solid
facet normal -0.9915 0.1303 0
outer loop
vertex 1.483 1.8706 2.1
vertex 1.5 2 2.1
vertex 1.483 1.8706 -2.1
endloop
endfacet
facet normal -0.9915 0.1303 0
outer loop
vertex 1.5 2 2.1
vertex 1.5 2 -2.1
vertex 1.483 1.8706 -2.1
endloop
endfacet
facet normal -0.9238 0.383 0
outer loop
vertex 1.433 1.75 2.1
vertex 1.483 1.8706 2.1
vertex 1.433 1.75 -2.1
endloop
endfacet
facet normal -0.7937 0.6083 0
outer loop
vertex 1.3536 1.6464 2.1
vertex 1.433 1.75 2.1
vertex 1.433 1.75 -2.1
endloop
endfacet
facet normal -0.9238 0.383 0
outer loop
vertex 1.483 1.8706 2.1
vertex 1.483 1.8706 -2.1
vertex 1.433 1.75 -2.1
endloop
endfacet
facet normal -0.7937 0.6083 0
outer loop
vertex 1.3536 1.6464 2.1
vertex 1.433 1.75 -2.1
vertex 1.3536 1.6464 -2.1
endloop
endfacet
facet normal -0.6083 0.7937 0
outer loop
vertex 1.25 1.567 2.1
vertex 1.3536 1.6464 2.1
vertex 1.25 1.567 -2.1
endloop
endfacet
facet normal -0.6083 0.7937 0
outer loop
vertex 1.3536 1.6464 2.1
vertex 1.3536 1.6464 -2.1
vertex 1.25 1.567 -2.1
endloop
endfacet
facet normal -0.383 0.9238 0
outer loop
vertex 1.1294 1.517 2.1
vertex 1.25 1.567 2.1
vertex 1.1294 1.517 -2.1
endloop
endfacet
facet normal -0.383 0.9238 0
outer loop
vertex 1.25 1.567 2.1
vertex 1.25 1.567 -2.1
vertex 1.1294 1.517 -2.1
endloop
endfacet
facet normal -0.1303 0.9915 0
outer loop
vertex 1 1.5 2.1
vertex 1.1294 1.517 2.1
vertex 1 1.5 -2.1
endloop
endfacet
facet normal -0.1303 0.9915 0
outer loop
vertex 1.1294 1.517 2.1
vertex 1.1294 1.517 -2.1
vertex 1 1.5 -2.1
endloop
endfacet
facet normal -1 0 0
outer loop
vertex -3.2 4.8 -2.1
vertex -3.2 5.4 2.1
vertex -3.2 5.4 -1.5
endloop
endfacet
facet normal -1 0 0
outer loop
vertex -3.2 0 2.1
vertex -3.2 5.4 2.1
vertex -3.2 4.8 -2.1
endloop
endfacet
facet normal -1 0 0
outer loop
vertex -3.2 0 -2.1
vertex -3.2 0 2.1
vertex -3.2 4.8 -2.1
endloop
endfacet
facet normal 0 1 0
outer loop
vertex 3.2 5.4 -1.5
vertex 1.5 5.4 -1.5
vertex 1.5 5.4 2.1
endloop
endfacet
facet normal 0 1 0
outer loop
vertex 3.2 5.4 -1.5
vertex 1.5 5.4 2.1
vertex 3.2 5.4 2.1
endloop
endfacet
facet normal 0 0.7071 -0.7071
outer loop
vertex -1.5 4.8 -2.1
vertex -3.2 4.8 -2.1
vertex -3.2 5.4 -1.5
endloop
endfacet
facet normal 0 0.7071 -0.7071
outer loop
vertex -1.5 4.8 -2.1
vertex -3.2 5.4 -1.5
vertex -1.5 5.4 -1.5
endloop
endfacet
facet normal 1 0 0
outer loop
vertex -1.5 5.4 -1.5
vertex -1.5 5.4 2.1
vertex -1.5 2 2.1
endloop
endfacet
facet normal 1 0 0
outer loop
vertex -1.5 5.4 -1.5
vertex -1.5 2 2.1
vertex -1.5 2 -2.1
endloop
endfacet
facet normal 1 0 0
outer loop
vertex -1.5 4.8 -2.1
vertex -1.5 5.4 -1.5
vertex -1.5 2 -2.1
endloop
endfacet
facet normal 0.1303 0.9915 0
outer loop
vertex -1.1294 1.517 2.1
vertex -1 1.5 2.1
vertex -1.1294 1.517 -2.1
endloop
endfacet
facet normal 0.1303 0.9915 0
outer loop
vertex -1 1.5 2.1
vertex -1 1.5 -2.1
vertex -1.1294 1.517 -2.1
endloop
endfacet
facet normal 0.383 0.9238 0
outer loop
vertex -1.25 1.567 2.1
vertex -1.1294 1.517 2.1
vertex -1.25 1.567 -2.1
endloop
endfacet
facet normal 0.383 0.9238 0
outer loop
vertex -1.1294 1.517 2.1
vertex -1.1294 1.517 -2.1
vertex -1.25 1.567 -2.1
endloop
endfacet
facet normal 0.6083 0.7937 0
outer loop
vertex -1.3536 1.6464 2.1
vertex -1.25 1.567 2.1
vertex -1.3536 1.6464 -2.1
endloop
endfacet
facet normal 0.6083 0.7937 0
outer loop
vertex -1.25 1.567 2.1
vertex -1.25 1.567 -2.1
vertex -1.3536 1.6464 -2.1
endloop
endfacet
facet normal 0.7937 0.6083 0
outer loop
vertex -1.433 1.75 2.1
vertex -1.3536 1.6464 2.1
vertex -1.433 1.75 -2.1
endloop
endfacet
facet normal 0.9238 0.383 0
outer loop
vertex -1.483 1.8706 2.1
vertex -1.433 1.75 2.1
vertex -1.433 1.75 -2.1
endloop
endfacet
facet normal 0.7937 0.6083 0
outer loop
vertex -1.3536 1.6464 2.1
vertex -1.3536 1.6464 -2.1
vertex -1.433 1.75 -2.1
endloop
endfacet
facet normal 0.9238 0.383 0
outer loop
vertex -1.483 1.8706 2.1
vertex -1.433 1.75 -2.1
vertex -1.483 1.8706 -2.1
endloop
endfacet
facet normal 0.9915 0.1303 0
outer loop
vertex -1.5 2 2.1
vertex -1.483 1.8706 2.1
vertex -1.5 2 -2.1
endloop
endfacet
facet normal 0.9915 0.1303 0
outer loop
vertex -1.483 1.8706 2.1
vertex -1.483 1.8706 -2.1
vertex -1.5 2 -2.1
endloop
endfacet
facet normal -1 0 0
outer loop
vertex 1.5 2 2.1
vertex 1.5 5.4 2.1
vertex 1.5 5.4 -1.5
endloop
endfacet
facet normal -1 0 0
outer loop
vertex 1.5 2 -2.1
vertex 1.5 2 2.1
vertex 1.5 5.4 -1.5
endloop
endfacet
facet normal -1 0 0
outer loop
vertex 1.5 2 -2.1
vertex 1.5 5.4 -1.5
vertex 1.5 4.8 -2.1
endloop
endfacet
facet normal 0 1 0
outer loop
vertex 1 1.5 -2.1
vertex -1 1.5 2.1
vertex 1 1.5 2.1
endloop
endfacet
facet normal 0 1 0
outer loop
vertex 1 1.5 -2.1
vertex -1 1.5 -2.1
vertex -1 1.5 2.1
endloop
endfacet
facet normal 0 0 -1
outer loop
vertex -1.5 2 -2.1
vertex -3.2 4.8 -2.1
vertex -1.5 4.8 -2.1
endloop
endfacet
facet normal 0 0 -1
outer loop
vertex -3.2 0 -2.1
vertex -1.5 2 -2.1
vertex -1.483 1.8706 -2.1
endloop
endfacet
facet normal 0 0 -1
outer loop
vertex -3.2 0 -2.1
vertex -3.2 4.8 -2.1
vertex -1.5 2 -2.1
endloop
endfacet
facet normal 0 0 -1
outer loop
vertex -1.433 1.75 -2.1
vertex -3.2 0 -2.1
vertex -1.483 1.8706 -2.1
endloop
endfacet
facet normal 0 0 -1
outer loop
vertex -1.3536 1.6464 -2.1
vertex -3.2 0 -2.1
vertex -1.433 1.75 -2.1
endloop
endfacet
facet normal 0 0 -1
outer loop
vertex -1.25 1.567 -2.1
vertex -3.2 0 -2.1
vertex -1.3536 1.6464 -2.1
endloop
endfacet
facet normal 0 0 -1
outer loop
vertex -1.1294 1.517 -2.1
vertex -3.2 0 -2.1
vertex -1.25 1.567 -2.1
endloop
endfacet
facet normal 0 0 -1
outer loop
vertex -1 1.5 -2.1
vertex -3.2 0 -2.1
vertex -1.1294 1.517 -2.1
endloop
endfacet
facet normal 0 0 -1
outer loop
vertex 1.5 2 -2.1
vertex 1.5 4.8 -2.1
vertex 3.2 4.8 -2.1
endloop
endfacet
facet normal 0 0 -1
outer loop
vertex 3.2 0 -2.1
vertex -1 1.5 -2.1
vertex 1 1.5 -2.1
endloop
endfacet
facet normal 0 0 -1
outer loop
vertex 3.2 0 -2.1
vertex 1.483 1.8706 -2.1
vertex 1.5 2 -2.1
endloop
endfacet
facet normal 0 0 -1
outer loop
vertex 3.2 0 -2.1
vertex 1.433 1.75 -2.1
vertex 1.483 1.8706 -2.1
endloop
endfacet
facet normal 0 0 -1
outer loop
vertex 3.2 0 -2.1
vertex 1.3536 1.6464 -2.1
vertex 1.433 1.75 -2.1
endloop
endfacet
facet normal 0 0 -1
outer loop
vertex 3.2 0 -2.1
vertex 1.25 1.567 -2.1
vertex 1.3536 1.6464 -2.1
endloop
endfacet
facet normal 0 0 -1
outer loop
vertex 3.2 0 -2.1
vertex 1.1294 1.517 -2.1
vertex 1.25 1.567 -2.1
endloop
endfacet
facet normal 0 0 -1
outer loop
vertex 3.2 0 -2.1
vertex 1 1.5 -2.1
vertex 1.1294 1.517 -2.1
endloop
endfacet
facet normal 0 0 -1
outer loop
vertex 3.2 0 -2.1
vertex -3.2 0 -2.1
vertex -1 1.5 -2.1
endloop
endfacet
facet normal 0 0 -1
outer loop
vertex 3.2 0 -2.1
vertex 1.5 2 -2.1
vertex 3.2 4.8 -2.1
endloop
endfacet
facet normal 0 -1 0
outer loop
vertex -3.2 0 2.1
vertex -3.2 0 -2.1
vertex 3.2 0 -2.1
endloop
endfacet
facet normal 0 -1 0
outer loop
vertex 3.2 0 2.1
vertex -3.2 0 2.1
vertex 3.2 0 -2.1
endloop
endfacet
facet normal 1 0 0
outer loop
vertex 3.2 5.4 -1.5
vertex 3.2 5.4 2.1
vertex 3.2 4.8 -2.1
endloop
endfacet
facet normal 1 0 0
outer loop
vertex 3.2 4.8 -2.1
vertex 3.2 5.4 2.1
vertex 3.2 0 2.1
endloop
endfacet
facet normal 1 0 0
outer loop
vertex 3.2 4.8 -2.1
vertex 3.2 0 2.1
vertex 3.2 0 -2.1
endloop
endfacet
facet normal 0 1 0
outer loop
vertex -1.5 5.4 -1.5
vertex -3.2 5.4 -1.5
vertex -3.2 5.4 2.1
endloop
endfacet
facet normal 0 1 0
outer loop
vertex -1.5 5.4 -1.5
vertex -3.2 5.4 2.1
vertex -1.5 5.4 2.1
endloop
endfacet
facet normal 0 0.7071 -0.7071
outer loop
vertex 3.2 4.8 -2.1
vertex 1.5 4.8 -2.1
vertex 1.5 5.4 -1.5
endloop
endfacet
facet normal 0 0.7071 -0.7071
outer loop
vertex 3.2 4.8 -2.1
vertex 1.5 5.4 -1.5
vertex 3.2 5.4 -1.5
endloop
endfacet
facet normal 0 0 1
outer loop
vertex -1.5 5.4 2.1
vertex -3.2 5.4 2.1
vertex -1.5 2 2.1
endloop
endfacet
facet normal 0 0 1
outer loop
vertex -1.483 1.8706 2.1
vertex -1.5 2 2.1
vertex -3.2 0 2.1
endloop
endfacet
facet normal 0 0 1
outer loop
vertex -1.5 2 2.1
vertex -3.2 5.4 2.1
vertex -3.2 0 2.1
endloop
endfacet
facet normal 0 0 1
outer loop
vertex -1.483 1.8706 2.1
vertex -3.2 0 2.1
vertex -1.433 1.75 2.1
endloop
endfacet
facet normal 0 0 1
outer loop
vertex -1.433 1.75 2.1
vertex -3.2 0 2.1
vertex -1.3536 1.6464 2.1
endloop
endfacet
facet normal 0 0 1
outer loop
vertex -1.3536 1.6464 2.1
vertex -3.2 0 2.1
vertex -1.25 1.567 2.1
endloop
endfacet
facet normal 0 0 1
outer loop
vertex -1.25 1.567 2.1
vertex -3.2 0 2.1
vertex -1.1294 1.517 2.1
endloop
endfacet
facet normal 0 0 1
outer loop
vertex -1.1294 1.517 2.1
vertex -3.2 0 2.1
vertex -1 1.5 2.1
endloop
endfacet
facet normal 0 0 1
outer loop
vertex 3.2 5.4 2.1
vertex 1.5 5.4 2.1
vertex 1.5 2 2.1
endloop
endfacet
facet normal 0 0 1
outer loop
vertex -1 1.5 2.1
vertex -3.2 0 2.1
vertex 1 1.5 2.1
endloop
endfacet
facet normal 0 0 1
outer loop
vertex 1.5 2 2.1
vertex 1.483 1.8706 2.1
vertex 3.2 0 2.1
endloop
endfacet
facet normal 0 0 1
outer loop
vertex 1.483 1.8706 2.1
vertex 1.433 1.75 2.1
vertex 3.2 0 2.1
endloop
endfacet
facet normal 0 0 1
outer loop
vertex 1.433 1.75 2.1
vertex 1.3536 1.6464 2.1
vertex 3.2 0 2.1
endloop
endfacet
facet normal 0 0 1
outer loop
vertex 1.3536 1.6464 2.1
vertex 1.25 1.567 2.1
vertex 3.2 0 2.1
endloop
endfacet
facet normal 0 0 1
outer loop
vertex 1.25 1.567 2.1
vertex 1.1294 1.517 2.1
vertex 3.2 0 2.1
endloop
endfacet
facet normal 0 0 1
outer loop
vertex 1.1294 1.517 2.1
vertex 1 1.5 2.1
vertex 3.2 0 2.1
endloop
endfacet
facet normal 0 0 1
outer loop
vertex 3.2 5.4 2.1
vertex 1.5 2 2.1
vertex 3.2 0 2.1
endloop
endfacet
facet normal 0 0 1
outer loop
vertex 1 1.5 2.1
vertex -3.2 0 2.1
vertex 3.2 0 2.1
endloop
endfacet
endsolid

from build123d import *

# Parameters (mm, degrees)
SKETCH1_W           = 6.4
SKETCH1_H           = 4.2
BOSS_EXTRUDE1_DEPTH = 5.4
SKETCH2_W           = 3
SKETCH2_H           = 4.2
CUT_EXTRUDE1_DEPTH  = 3.9
FILLET1_R           = 0.5
CHAMFER1_SIZE       = 0.6


with BuildPart() as part:
    # Sketch1 → Boss-Extrude1 (new body)
    with BuildSketch(Plane(origin=(0, 0, 0), x_dir=(1, 0, 0), z_dir=(0, 1, 0))):
        Rectangle(SKETCH1_W, SKETCH1_H)
    extrude(amount=BOSS_EXTRUDE1_DEPTH)

    # Sketch2 → Cut-Extrude1 (cut)
    with BuildSketch(Plane(origin=(0, 5.4, 0), x_dir=(1, 0, 0), z_dir=(0, 1, 0))):
        Rectangle(SKETCH2_W, SKETCH2_H)
    extrude(amount=-CUT_EXTRUDE1_DEPTH, mode=Mode.SUBTRACT)

    # Fillet1
    fillet1_edges = [part.edges().sort_by_distance(p)[0] for p in [
        (-1.5, 1.5, 0),
        (1.5, 1.5, 0),
    ]]
    fillet(fillet1_edges, radius=FILLET1_R)

    # Chamfer1
    chamfer1_edges = [part.edges().sort_by_distance(p)[0] for p in [
        (2.35, 5.4, -2.1),
        (-2.35, 5.4, -2.1),
    ]]
    chamfer(chamfer1_edges, length=CHAMFER1_SIZE)


solid = part.part
